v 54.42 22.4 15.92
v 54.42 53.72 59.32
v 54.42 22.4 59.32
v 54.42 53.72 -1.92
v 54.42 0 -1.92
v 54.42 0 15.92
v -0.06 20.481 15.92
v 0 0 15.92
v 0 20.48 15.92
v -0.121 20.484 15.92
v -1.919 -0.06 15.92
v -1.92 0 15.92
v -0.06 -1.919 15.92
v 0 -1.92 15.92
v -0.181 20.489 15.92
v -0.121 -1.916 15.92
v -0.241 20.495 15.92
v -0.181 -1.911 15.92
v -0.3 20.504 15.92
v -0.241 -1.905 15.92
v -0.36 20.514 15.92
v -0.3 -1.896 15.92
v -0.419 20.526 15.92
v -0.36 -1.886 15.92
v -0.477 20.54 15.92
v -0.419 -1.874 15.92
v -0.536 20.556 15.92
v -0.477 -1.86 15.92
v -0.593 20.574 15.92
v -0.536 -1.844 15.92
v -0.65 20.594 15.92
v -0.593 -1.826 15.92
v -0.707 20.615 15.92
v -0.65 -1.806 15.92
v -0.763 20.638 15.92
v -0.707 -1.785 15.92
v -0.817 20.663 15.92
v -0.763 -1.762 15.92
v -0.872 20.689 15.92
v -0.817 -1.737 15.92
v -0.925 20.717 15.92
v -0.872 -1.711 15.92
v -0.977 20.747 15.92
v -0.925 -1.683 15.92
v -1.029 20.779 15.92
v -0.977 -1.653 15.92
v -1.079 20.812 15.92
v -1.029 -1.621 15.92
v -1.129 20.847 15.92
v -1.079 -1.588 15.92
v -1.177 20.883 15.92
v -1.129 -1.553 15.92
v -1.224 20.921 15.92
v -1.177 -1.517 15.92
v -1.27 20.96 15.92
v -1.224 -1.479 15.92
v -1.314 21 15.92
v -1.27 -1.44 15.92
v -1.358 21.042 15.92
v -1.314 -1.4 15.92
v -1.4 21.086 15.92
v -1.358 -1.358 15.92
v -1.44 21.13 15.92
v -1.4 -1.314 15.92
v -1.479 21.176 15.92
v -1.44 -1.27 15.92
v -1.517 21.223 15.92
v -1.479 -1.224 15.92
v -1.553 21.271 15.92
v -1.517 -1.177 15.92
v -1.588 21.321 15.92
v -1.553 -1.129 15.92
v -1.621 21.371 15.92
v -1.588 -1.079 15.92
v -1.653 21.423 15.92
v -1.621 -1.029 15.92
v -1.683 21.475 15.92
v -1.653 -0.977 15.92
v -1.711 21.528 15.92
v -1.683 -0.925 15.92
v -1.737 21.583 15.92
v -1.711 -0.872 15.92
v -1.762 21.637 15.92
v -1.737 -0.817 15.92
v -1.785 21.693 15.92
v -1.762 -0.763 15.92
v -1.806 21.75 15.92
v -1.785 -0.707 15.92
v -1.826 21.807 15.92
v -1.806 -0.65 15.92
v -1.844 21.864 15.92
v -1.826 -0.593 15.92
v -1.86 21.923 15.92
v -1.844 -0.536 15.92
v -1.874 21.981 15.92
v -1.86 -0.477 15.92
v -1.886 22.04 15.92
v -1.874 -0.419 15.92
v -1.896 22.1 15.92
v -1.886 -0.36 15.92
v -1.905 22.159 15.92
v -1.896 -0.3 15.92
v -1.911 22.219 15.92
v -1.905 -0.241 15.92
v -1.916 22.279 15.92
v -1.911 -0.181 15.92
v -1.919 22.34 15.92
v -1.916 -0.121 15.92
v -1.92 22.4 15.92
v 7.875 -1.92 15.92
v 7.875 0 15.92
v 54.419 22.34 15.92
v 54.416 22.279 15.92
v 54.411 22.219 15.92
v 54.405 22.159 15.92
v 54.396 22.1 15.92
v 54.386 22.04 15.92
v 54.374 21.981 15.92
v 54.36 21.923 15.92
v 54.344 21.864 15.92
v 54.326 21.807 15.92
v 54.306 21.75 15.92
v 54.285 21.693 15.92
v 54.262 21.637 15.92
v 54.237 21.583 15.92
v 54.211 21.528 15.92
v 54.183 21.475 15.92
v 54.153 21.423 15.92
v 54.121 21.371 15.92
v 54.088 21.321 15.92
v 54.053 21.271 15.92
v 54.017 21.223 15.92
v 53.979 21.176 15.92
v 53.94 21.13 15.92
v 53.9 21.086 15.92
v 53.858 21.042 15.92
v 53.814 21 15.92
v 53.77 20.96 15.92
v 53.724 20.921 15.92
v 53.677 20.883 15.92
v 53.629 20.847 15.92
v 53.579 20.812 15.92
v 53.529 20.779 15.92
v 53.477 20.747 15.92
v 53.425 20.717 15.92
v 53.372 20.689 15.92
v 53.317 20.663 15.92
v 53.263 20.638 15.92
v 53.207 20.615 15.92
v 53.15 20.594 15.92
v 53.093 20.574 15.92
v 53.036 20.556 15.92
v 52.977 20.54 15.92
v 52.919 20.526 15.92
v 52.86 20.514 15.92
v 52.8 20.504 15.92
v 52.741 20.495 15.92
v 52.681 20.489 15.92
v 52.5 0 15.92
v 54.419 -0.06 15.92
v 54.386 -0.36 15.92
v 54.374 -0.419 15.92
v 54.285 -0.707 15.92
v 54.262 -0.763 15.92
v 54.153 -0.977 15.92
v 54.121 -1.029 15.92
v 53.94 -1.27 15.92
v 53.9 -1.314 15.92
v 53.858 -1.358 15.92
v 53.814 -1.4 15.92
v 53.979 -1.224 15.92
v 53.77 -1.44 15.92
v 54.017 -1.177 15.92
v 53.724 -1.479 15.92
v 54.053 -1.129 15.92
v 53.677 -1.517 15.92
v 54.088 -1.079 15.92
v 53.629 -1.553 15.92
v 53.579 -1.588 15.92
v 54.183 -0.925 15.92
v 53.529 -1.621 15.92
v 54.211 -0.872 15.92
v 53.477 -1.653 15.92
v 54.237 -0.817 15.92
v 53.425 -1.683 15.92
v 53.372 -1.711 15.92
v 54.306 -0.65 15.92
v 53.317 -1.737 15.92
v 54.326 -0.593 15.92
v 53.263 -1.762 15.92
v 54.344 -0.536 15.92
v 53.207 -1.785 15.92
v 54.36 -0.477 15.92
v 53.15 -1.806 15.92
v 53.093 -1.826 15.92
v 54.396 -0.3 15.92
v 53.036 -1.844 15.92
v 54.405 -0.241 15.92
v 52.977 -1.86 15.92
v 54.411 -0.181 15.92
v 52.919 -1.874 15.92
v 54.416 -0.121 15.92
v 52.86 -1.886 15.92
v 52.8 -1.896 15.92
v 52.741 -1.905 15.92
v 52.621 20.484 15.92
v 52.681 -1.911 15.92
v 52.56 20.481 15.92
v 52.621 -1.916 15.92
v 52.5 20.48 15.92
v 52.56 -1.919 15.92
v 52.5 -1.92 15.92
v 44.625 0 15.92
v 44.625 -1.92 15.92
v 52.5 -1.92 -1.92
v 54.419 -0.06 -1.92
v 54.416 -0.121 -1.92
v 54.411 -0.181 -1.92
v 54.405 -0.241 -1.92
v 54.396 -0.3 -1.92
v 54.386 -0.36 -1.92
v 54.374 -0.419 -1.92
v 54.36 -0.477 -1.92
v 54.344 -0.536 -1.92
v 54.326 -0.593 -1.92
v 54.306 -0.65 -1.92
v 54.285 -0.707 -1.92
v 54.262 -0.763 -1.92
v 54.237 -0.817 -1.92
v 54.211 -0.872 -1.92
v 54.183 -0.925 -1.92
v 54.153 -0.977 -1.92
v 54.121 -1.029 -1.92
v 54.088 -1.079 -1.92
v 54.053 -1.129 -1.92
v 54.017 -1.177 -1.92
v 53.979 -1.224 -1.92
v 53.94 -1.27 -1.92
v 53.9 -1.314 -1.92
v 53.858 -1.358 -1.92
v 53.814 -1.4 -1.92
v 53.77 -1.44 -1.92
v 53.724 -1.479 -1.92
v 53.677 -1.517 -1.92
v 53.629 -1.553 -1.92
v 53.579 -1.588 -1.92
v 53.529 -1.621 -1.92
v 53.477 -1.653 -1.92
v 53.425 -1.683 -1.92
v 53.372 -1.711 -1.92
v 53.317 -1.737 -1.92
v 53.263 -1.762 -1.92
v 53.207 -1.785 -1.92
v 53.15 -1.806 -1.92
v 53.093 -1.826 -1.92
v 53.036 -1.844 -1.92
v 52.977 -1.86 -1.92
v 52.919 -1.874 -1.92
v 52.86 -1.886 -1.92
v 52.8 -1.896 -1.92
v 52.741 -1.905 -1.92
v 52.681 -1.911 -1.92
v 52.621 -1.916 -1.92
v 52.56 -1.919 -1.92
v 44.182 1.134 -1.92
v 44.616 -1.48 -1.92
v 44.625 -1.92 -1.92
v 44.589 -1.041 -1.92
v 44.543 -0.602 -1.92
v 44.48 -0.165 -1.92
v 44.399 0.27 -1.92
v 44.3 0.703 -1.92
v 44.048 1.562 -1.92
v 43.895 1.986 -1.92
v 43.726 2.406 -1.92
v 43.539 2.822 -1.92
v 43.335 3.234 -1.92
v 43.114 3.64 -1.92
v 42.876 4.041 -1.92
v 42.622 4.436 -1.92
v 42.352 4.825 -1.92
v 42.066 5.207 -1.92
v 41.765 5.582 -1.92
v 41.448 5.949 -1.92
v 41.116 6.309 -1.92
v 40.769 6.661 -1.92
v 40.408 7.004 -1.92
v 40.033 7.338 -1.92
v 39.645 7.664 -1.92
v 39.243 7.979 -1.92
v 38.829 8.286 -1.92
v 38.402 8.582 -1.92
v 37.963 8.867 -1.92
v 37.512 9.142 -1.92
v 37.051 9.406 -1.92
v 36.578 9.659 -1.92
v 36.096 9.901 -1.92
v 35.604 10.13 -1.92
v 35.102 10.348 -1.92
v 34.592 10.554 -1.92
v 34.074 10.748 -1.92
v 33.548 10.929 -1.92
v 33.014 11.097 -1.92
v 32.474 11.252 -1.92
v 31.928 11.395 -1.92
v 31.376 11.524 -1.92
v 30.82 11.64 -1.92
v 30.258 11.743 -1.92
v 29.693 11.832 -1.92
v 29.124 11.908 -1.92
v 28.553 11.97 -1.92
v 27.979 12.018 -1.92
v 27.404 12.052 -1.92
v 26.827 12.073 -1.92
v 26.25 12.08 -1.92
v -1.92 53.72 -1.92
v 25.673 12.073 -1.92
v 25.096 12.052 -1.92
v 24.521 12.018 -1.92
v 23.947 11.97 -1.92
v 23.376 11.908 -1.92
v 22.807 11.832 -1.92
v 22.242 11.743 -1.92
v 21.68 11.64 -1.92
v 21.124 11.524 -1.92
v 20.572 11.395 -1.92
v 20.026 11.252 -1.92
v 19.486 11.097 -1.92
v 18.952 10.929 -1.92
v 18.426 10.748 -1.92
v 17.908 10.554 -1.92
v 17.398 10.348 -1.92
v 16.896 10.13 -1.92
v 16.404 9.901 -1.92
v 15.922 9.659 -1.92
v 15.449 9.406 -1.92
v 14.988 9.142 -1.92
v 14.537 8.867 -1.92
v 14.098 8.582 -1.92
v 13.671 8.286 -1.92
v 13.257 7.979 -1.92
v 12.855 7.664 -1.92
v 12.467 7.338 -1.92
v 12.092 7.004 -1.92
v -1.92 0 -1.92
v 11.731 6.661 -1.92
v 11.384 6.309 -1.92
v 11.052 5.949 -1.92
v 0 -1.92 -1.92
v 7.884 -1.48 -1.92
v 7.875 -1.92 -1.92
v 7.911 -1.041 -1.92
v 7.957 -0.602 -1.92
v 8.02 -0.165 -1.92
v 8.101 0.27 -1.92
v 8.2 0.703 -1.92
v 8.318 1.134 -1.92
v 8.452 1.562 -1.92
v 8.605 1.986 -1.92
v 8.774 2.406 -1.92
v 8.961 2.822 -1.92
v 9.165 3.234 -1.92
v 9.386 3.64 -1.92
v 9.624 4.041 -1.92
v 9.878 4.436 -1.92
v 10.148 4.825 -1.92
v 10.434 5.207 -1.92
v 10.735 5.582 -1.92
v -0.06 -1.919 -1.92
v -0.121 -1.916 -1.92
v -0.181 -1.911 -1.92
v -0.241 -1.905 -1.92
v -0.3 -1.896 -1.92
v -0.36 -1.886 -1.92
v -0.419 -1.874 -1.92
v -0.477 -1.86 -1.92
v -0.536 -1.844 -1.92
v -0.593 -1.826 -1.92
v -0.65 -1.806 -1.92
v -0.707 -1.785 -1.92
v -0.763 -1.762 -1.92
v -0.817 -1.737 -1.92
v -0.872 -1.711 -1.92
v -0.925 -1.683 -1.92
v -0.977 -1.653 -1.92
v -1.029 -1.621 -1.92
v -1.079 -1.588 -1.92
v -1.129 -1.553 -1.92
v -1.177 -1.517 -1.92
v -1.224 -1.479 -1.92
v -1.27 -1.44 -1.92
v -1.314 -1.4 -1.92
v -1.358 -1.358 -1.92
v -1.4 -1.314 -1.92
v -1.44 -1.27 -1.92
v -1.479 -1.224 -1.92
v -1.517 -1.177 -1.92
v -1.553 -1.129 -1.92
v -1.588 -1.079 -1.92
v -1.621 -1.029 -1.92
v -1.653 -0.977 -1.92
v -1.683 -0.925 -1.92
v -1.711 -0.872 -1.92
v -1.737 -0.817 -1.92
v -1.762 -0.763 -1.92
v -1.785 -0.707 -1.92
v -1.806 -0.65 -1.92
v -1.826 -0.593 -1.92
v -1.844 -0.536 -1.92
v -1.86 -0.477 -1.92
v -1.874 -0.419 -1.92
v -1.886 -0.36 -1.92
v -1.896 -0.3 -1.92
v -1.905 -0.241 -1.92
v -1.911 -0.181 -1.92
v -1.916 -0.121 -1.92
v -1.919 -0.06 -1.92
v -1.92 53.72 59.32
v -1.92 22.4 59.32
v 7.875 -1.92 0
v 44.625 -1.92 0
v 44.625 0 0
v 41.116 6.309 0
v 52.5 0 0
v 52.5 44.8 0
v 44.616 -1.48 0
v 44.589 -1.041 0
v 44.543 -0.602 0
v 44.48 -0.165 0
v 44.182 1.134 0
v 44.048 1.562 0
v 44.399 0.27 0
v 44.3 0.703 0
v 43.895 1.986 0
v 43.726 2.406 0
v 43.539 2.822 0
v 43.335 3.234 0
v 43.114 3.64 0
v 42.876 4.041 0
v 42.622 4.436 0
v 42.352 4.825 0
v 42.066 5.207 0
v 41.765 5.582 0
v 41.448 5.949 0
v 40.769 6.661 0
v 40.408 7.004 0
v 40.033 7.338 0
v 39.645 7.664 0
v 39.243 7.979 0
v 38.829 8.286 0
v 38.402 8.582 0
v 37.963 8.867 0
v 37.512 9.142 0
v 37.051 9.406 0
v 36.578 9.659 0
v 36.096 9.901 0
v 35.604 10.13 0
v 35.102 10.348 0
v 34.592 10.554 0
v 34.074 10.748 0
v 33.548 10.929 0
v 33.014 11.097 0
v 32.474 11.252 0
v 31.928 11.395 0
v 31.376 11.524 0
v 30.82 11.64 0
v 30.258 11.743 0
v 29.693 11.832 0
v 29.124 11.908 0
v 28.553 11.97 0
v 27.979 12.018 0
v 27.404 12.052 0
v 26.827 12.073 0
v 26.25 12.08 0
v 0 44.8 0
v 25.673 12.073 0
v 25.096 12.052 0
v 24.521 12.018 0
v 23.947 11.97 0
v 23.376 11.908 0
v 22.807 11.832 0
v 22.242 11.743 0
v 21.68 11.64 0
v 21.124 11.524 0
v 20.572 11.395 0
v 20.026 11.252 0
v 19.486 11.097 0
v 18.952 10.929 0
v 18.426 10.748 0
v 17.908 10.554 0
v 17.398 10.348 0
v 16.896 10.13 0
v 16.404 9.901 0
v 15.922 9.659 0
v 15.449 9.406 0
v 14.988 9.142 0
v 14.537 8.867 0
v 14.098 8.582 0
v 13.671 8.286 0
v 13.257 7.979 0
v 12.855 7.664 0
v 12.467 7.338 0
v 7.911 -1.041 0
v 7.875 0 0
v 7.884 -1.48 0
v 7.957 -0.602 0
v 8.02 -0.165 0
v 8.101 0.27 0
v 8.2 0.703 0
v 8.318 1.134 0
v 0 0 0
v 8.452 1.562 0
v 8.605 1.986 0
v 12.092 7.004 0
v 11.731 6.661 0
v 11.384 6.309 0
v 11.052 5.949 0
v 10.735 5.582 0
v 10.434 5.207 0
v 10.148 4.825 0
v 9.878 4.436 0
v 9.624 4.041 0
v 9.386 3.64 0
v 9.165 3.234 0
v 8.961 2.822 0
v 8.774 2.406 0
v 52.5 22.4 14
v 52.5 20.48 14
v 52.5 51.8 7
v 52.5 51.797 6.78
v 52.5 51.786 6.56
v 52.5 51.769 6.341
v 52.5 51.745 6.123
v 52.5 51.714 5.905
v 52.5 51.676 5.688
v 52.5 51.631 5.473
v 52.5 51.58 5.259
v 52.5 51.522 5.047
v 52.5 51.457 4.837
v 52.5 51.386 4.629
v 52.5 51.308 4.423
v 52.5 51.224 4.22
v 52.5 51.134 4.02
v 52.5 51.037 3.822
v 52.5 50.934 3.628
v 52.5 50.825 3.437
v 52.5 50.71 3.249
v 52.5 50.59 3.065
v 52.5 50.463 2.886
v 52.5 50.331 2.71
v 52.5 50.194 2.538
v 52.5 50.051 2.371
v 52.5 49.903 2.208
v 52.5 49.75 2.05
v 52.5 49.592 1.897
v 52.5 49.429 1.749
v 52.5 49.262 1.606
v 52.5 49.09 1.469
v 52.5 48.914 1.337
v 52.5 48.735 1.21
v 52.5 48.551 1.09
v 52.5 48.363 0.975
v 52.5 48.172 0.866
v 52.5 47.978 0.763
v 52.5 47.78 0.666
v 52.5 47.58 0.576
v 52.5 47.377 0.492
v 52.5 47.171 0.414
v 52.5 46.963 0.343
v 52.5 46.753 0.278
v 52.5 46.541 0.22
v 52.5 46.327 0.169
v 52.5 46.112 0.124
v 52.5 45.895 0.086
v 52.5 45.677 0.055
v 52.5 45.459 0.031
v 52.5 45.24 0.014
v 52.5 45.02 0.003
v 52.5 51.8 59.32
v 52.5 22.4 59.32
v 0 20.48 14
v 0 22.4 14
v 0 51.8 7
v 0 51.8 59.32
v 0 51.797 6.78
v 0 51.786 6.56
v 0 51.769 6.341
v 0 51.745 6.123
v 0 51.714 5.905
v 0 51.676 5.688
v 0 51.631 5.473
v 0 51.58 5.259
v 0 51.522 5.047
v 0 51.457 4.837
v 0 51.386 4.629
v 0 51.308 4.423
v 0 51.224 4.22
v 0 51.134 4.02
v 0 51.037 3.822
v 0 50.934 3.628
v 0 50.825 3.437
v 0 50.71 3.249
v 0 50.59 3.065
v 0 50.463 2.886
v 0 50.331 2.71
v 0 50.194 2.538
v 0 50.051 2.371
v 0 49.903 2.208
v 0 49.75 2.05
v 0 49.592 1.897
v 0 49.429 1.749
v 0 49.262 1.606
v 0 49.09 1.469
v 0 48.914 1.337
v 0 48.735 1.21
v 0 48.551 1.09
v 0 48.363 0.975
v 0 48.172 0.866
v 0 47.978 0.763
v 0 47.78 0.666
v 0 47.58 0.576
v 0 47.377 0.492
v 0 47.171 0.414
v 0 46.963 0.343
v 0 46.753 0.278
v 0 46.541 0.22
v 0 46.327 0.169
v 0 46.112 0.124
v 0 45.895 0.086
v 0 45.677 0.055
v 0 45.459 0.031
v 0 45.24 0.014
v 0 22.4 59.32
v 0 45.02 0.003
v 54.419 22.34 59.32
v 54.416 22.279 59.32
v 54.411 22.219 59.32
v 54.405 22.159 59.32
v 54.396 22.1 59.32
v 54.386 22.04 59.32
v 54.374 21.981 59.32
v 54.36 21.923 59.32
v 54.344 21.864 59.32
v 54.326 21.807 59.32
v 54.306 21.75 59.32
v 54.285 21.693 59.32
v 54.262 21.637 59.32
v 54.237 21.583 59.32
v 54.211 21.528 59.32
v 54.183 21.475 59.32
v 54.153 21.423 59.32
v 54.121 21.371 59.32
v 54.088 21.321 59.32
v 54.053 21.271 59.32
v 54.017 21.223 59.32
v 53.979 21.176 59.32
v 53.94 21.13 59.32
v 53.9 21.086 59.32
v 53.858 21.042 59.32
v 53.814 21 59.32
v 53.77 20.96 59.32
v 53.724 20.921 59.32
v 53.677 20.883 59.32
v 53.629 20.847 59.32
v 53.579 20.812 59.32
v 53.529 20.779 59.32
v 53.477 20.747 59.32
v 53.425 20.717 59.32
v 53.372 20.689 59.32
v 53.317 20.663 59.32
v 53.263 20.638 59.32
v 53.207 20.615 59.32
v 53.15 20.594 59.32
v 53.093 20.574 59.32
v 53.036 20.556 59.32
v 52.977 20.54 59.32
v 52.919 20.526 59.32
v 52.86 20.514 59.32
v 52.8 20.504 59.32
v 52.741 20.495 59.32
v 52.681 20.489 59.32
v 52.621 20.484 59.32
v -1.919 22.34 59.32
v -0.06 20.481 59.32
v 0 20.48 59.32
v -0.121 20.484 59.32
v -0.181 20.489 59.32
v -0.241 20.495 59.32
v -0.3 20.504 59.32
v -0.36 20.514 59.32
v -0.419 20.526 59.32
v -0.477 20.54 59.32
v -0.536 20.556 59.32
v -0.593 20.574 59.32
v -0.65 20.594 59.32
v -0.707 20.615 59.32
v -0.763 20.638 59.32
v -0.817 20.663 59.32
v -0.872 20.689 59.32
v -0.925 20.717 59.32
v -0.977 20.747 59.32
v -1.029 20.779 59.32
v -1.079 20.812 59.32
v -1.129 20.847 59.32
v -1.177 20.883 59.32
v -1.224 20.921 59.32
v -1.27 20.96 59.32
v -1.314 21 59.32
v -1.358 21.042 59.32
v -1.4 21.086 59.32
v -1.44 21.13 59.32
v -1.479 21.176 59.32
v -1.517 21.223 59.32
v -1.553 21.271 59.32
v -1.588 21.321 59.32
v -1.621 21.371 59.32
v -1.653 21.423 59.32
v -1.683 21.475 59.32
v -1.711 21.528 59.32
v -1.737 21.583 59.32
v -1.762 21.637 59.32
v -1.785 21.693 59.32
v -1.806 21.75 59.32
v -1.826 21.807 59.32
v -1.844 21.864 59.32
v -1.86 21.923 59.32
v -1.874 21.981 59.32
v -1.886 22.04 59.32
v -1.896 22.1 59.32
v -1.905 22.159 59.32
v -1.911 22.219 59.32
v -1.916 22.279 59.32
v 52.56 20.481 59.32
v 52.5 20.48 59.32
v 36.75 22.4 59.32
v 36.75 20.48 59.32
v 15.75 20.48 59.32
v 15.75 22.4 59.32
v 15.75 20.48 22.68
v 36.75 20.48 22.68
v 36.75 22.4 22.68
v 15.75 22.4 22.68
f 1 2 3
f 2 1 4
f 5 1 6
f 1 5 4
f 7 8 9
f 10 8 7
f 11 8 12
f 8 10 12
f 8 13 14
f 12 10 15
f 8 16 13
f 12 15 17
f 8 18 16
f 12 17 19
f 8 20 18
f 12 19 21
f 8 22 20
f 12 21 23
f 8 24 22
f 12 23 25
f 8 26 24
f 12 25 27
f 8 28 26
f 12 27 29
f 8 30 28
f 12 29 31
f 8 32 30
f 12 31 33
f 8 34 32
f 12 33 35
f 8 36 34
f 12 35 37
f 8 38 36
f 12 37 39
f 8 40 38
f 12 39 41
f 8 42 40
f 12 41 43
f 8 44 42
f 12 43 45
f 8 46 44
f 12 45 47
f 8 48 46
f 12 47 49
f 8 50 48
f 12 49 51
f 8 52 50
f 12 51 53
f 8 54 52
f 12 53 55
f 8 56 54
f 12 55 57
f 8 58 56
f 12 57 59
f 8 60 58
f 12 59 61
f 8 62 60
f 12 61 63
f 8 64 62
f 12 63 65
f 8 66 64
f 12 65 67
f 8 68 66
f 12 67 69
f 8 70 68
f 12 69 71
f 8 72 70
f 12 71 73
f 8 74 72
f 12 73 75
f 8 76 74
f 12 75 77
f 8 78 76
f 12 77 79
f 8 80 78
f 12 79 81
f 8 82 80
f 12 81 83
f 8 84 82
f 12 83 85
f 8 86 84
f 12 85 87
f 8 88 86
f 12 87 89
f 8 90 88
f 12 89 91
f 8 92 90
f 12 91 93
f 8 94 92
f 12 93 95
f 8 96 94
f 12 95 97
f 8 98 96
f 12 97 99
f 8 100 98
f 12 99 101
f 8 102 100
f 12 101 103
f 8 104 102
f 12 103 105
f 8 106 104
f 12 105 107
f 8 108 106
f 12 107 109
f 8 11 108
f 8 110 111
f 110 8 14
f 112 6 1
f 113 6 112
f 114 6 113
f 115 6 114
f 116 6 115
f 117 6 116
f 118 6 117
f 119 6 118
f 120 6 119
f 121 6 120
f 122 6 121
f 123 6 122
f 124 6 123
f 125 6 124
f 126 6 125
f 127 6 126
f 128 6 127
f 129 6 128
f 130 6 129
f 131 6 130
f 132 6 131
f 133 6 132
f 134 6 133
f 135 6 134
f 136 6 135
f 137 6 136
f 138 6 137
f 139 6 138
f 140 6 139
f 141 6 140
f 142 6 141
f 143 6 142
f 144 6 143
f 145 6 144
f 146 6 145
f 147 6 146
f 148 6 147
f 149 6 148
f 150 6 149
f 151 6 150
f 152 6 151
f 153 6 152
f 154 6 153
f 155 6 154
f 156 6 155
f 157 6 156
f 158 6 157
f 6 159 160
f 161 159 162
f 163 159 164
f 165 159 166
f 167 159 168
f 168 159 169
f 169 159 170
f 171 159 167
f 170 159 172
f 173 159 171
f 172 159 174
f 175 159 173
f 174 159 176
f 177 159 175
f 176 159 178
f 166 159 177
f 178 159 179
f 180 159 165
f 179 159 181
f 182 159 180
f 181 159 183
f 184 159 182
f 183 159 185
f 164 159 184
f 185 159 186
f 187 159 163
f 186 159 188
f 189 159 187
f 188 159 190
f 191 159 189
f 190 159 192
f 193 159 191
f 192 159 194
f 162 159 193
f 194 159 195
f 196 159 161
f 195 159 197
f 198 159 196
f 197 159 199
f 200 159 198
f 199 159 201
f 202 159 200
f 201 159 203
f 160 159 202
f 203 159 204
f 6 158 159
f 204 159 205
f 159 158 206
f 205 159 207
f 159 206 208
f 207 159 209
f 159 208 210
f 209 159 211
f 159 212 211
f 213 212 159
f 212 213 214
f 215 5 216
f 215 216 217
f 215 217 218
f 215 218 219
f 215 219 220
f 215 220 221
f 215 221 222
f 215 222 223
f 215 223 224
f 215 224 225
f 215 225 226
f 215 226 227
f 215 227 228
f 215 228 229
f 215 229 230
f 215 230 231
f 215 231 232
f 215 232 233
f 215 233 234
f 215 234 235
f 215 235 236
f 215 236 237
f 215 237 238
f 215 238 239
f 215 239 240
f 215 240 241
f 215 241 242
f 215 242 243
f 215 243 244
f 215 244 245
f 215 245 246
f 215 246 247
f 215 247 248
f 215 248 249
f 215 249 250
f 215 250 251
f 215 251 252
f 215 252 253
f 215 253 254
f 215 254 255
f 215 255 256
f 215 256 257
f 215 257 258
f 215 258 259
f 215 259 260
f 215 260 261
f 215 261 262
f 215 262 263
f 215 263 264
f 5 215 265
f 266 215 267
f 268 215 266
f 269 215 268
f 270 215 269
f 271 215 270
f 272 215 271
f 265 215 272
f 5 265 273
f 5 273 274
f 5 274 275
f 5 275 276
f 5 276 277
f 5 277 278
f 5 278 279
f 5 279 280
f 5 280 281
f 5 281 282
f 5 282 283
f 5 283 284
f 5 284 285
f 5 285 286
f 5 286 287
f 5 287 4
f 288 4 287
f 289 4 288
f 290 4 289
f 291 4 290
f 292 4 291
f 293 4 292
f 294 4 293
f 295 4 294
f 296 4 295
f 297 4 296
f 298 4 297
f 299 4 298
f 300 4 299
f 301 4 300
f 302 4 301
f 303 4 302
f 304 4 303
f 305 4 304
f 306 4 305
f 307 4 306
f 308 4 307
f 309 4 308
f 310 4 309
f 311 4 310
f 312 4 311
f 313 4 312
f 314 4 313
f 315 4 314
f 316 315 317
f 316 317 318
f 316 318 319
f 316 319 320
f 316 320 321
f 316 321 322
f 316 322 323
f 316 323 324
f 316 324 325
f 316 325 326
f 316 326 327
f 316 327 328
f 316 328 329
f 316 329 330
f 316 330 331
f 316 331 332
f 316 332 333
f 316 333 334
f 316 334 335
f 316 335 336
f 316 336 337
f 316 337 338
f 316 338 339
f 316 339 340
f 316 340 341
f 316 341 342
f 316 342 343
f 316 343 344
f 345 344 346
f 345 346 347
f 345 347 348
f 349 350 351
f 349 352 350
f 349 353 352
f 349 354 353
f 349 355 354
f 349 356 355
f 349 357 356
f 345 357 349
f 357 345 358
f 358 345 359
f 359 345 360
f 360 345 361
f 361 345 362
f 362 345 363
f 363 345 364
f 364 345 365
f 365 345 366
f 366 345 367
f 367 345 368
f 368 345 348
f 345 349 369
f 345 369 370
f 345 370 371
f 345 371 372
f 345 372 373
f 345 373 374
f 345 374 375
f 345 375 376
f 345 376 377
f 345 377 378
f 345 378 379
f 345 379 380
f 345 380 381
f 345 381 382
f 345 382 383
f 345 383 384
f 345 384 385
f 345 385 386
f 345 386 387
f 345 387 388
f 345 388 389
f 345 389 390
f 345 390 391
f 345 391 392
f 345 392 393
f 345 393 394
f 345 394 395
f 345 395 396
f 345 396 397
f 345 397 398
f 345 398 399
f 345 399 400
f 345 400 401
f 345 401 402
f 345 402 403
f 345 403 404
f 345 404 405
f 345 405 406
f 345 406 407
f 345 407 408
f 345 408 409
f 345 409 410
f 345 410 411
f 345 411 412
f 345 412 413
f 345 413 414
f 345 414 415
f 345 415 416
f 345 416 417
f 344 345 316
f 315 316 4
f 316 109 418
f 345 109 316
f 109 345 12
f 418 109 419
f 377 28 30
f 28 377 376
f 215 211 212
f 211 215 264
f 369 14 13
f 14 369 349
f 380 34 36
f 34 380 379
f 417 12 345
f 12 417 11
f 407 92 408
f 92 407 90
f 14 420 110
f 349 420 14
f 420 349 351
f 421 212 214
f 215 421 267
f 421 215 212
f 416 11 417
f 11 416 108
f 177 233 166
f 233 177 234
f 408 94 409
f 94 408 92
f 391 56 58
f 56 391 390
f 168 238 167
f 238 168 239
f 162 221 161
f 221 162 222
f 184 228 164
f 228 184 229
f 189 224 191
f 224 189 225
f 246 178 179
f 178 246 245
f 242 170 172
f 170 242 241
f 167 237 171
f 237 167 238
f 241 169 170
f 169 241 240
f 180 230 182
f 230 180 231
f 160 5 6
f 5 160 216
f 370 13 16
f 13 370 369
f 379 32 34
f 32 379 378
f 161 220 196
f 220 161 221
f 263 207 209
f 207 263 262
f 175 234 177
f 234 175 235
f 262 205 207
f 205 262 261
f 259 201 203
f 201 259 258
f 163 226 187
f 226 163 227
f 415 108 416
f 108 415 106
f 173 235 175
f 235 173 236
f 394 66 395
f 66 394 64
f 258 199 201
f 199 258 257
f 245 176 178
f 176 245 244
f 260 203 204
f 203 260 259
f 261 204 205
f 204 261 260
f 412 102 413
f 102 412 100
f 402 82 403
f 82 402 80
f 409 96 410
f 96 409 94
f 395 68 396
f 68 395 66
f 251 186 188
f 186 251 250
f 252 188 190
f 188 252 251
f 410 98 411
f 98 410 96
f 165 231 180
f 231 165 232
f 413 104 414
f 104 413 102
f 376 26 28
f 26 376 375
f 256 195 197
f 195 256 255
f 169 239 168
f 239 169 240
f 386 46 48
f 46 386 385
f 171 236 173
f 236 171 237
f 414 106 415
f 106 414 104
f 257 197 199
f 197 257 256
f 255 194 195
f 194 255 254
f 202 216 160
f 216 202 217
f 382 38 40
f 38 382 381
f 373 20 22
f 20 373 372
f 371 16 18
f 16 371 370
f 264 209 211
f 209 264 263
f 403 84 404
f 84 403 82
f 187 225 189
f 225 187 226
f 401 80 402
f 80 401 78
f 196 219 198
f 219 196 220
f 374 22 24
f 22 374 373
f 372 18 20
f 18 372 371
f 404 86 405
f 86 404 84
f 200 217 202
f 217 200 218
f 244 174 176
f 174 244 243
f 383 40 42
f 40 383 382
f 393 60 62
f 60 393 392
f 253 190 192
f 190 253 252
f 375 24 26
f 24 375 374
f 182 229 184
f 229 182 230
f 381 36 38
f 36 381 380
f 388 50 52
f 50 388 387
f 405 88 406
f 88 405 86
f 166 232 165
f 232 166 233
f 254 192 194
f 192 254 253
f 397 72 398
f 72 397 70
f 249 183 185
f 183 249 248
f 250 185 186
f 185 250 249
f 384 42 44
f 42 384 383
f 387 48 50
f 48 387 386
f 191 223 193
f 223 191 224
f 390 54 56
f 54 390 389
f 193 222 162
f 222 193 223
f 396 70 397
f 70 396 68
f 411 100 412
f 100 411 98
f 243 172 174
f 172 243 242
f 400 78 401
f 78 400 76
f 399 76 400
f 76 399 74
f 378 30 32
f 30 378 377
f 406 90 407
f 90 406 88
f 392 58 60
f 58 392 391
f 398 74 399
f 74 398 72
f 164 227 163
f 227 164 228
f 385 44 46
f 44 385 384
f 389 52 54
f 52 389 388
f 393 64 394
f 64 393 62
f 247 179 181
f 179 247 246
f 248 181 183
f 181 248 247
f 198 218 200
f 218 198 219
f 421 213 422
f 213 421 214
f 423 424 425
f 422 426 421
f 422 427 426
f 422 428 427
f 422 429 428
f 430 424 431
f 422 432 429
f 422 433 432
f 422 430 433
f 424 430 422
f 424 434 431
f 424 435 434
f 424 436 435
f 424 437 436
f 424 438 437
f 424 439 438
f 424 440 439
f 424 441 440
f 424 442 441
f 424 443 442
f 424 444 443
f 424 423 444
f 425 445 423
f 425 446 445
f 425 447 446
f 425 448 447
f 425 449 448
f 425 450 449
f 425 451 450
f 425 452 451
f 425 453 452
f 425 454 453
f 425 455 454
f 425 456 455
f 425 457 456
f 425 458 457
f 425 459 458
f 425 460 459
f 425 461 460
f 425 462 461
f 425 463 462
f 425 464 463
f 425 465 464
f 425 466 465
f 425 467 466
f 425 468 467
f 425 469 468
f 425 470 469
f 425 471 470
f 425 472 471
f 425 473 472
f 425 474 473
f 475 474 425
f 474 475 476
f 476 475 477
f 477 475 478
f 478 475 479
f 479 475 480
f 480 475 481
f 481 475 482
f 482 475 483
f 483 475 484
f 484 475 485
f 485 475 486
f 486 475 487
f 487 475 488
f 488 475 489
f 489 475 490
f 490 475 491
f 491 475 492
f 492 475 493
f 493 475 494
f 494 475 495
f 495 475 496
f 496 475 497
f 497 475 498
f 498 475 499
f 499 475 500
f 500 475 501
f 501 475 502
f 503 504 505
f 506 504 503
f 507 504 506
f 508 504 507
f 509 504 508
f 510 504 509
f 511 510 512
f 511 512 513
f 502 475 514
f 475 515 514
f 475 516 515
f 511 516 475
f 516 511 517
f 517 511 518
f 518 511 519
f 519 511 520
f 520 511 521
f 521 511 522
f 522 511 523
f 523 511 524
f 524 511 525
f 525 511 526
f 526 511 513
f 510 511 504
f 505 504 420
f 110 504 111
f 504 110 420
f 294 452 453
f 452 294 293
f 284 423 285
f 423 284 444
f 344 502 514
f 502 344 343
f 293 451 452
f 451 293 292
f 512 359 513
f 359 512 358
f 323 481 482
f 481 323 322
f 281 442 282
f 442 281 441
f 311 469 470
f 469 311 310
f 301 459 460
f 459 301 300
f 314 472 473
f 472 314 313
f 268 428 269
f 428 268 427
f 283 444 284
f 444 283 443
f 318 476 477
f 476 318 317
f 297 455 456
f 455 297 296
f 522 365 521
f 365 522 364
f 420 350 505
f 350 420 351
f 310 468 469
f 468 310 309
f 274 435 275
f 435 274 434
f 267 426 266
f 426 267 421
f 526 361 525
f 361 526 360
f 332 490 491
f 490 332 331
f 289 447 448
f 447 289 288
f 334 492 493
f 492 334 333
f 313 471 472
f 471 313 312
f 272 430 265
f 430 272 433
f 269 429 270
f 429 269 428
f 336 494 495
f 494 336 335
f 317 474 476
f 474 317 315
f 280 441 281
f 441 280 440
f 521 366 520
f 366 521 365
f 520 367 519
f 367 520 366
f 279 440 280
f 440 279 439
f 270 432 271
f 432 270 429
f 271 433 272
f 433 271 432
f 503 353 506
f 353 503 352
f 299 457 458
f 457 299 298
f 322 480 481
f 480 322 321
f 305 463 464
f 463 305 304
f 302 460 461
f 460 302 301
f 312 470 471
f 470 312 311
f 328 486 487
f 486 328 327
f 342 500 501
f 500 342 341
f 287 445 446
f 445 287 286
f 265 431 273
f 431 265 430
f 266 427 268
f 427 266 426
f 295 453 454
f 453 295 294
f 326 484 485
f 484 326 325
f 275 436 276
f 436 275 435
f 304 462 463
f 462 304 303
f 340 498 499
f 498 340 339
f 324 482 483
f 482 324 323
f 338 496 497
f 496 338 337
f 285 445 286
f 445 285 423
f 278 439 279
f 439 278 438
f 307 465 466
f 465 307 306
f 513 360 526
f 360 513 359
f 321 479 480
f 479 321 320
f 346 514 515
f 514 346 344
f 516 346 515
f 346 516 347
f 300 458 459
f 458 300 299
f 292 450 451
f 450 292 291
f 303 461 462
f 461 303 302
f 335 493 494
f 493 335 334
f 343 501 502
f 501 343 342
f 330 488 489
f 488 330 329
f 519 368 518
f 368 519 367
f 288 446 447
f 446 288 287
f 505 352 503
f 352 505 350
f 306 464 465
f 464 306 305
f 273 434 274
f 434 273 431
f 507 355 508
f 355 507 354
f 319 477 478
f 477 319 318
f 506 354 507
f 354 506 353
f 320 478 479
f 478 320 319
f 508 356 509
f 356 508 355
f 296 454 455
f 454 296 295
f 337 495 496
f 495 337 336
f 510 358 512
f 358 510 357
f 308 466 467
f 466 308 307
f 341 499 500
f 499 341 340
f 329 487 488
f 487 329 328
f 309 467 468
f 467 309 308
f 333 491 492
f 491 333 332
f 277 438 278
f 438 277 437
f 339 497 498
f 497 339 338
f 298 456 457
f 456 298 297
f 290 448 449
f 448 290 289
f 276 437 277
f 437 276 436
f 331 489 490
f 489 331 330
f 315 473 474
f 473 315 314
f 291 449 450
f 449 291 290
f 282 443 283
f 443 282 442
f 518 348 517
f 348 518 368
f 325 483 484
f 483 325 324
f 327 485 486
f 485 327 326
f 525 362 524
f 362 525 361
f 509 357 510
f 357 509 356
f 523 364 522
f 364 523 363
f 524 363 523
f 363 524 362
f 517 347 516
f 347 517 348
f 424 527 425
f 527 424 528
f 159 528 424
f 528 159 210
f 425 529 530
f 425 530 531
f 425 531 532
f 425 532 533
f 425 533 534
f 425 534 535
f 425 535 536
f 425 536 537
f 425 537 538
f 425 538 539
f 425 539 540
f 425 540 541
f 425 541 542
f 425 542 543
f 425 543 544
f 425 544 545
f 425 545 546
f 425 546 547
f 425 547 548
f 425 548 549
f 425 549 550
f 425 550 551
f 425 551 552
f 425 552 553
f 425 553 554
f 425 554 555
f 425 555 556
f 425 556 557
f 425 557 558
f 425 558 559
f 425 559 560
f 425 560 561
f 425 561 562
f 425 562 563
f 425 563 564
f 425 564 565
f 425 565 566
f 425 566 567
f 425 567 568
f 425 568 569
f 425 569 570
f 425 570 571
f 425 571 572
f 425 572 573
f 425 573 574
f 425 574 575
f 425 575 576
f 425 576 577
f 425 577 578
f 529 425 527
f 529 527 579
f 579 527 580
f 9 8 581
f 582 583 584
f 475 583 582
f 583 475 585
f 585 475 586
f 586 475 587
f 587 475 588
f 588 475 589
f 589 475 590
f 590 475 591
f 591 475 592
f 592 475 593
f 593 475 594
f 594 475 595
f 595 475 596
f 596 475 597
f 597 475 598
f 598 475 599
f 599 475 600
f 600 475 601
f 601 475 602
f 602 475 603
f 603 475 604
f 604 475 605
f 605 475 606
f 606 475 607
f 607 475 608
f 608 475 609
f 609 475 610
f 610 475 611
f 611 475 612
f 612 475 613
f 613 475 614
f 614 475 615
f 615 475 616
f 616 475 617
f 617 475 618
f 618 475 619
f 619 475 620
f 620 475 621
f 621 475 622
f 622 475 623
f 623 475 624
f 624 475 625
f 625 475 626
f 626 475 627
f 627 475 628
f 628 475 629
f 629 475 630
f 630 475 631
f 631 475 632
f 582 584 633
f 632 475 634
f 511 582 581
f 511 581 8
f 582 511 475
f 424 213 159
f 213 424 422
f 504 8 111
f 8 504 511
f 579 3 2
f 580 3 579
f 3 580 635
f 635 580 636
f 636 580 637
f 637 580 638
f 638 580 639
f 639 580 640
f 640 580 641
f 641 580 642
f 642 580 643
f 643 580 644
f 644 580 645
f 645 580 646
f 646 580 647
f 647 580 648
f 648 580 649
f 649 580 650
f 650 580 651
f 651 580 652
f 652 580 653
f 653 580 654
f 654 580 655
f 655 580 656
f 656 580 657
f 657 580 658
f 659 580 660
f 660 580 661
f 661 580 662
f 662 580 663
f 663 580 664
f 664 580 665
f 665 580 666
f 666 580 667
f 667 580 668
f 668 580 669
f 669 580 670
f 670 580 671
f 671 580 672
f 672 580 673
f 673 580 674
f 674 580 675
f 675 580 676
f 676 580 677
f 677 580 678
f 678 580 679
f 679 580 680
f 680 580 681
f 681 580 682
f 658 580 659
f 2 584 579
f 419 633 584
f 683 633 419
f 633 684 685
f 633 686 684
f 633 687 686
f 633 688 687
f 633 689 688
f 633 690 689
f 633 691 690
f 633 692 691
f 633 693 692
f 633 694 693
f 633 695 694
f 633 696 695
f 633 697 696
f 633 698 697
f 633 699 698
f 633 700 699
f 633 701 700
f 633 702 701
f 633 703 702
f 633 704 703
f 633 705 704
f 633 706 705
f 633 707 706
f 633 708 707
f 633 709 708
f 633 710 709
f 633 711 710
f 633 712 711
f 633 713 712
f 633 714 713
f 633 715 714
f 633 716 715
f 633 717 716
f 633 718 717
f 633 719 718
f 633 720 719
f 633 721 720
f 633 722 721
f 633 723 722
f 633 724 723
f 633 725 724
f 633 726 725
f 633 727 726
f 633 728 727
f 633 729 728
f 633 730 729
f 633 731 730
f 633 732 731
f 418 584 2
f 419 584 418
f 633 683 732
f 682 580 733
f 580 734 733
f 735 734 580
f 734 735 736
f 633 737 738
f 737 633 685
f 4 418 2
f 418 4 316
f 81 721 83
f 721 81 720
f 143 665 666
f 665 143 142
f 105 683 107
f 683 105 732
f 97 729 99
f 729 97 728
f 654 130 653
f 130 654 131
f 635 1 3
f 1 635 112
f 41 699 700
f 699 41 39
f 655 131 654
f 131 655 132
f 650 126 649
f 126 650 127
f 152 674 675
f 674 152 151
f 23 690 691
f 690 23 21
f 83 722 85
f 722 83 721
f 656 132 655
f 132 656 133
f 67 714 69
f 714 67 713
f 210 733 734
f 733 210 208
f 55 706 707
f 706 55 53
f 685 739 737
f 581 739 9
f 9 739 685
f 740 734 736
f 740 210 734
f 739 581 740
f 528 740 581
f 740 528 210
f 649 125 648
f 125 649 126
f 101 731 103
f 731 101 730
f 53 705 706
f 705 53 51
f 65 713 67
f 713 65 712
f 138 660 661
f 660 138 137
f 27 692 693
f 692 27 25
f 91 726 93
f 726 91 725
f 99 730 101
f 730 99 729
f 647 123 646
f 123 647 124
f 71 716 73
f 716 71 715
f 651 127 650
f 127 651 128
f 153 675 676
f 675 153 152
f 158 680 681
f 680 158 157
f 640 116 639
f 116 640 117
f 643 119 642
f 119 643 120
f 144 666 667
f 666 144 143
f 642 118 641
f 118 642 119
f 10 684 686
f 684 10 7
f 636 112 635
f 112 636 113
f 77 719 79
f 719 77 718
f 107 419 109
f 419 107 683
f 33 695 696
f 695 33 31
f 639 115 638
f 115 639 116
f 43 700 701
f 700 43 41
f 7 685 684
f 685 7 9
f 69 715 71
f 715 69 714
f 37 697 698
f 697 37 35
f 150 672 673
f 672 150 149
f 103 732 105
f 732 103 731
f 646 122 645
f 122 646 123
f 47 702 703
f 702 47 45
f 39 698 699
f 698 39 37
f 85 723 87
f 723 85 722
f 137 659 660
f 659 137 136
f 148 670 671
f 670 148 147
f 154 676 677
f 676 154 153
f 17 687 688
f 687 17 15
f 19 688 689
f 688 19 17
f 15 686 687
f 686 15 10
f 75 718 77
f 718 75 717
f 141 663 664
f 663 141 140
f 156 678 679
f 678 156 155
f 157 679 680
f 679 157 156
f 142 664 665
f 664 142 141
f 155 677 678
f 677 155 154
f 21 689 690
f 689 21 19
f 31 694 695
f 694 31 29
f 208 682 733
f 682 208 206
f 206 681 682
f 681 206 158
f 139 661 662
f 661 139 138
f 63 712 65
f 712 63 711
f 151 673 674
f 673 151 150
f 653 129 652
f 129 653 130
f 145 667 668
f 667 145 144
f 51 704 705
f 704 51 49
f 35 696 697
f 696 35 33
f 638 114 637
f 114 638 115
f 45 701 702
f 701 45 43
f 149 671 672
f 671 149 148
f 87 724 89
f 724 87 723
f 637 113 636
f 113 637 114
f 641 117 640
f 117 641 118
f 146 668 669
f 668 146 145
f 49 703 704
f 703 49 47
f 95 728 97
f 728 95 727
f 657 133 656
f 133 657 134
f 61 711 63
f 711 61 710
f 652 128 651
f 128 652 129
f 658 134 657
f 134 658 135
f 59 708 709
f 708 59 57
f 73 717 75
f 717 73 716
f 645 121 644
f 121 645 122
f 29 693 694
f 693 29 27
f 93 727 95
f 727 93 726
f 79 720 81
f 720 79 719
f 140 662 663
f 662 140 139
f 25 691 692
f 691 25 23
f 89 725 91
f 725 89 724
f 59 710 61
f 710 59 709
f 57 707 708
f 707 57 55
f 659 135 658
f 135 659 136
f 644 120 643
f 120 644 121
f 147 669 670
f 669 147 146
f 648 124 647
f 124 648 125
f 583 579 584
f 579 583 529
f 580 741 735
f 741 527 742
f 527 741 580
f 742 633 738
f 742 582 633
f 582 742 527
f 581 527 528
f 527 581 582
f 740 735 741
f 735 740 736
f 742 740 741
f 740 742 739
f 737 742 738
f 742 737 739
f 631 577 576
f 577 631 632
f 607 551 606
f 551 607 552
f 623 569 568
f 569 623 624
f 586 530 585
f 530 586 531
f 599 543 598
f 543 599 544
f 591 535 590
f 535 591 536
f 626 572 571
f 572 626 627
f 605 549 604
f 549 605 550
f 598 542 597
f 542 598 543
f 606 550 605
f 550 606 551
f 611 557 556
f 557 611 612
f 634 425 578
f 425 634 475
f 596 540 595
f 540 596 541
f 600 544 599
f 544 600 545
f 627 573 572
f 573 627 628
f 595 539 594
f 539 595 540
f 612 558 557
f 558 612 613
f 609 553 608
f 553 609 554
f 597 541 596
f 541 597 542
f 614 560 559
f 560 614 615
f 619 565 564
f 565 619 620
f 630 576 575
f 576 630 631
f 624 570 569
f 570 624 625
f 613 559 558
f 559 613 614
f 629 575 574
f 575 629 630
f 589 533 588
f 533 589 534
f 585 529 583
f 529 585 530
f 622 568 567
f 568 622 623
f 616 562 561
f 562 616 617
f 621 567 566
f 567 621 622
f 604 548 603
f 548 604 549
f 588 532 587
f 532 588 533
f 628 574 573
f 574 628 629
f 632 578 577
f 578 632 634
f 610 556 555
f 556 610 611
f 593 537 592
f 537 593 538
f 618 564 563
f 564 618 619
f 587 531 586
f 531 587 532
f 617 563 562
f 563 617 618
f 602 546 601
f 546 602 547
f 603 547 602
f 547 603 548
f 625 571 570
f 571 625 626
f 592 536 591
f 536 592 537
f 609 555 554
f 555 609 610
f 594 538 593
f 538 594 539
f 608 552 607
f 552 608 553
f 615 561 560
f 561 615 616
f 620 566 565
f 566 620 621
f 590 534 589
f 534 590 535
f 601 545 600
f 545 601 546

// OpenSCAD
$fn=200;
// What is the length of the cylindrical object being stored OR what is the width you want the dispenser of little thingies to be (mm)?
obj_len = 50;

// What is the diameter of each cylindrical object OR what is the size of the little thingies (mm)?
obj_dia = 14;

// How many cylinders/thingies tall should the hopper be? The hopper can hold about depth*height cylinders.
hopper_height = 4; // [2:50]

// How many cylinders/thingies deep should the hopper be?
hopper_depth = 2; // [1:15]

// How many cylinders/thingies deep should the tray be?
num_tray = 1; // [1:15]

// How much extra margin do you want around the cylinders/thingies in the Y axe? 
obj_dia_margin_percentage = 10; // [0:100]
obj_dia_margin = obj_dia_margin_percentage/100;

// How much extra margin do you want around the cylinders/thingies in the X axis? 
obj_len_margin_percentage = 5; // [0:100]
obj_len_margin = obj_len_margin_percentage/100;

linewidth = 0.64;
// Thickness of the walls, increase for more strength but requiring more material (mm). 
wall_thickness = linewidth*3;

// What percentage of the hopper front should be open? Set to zero if storing little thingies instead of cylinders.
hopper_gap_percentage = 40; // [0:100]
hopper_gap_fraction = hopper_gap_percentage/100;

// What percentage of the hopper front height should be open? Used to print without support.
hopper_gap_height_percentage = 80; // [0:100]
hopper_gap_height_fraction = 1 - hopper_gap_height_percentage/100;

dip_type = "front_square+bottom_round"; // [front_round,front_square,front_square+bottom_round]

// What percentage of the tray front should have a rounded gap cut out of it? Set to zero if storing little thingies instead of cylinders.
dip_gap_percentage = 70; // [0:100]
dip_gap_fraction = dip_gap_percentage/100;

show_objects=0;

// dimensions of the empty space (not including walls)
space_w        = obj_len*(1             + obj_len_margin);
space_d_hopper = obj_dia*(hopper_depth  + obj_dia_margin);
space_d_tray   = obj_dia*(num_tray      + obj_dia_margin + 0.5);
space_h_hopper = obj_dia*(hopper_height + obj_dia_margin);
space_h_tray   = obj_dia;

//--------------------------------------------
// make the tray
tray([space_w,space_d_tray,space_h_tray],wall_thickness,dip_gap_fraction);

// make the hopper
translate([0,space_d_tray,0]) hopper([space_w,space_d_hopper,space_h_hopper],wall_thickness,hopper_gap_fraction,space_h_tray);

if(show_objects){
    // render virtual tray cylinders for display purposes
    for (i = [0:num_tray-1]) {
        %translate([obj_len*obj_len_margin/2,(obj_dia+obj_dia_margin)*(0.5+i+0.25),(obj_dia+obj_dia_margin)/2]) 
            rotate([0,90,0]) 
            cylinder(d=obj_dia,h=obj_len);
    }

    // render virtual hopper cylinders for display purposes
    translate([0,space_d_tray,0]) {
        for (i = [0:hopper_height-1], j = [0:hopper_depth-1]) {
            %translate([obj_len*obj_len_margin/2,(obj_dia+obj_dia_margin)*(0.5+j),(obj_dia+obj_dia_margin)*(0.5+i)]) 
                rotate([0,90,0]) 
                cylinder(d=obj_dia,h=obj_len);
        }
    }
}



module tray(size,wall_thickness,dip_gap_fraction) {
    difference() {
        union(){
            translate([-1,0,-1]*wall_thickness) 
                cube(size + [2,1,2]*wall_thickness);
            
            hull(){    
                translate([0,0,-1]*wall_thickness) 
                    cylinder(r=wall_thickness, h=size[2]+2*wall_thickness);
                        translate([size[0],0,0])
                translate([0,0,-1]*wall_thickness) 
                    cylinder(r=wall_thickness, h=size[2]+2*wall_thickness);
            }
        }
        
        cube(size + [0,wall_thickness*2,wall_thickness*2]);
        if (dip_gap_fraction) {
            if (dip_type=="front_round") {
                translate([size[0]/2,wall_thickness/2,size[2]]) 
                    rotate([90,0,0]) 
                    resize([size[0]*dip_gap_fraction, size[2]*2, wall_thickness*2]) 
                    cylinder(h=10,d=10);
                translate([size[0]*(1-dip_gap_fraction)/2,-1.5*wall_thickness,size[2]]) 
                    cube([size[0]*dip_gap_fraction,wall_thickness*2,wall_thickness*2]);
            } else if (dip_type=="front_square") {
                translate([size[0]*(1-dip_gap_fraction)/2,-1.5*wall_thickness,0]) 
                    cube([size[0]*dip_gap_fraction,wall_thickness*2,(size[2])+wall_thickness*2]);
            } else if (dip_type=="front_square+bottom_round") {
                translate([size[0]*(1-dip_gap_fraction)/2,-1.5*wall_thickness,0]) 
                    cube([size[0]*dip_gap_fraction,wall_thickness*2,(size[2])+wall_thickness*2]);
                translate([size[0]/2,-wall_thickness,-wall_thickness*1.5]) 
                    resize([size[0]*dip_gap_fraction, size[2]*2, wall_thickness*2]) 
                    cylinder(h=10,d=10);
            }
        }
    }
}

module hopper(size,wall_thickness,hopper_gap_fraction,tray_gap) {
    difference() {
        union(){
        translate([-1,0,-1]*wall_thickness) 
            cube(size + [2,1,2]*wall_thickness);
            
        hull(){    
            translate([0,0,-1]*wall_thickness) 
                cylinder(r=wall_thickness, h=size[2]+2*wall_thickness);
                    translate([size[0],0,0])
            translate([0,0,-1]*wall_thickness) 
                cylinder(r=wall_thickness, h=size[2]+2*wall_thickness);
        }
    }
        
        cube(size + [0,0,wall_thickness*2]); // main cavity plus open top
        
        translate([0,-wall_thickness*2,0]) 
            cube([size[0], size[1]+wall_thickness*2,tray_gap]); // bottom slot
        
    translate([size[0]*(1-hopper_gap_fraction)/2,-wall_thickness*2, tray_gap + (size[2] - tray_gap)*hopper_gap_height_fraction]) 
            cube(
                [size[0]*hopper_gap_fraction,size[1],size[2] - tray_gap] + 
                [0,wall_thickness*2,wall_thickness*2]
            ); // gap in the middle
    }
    // curved back bottom edge
    difference() {
        translate([0,size[1]-tray_gap/2,0]) cube([size[0],tray_gap/2,tray_gap/2]); // cube filling the back region
        translate([0,size[1]-tray_gap/2,tray_gap/2]) rotate([0,90,0]) cylinder(d=tray_gap,h=size[0]); // neg. cylinder carving the curve out
    }
        
}
